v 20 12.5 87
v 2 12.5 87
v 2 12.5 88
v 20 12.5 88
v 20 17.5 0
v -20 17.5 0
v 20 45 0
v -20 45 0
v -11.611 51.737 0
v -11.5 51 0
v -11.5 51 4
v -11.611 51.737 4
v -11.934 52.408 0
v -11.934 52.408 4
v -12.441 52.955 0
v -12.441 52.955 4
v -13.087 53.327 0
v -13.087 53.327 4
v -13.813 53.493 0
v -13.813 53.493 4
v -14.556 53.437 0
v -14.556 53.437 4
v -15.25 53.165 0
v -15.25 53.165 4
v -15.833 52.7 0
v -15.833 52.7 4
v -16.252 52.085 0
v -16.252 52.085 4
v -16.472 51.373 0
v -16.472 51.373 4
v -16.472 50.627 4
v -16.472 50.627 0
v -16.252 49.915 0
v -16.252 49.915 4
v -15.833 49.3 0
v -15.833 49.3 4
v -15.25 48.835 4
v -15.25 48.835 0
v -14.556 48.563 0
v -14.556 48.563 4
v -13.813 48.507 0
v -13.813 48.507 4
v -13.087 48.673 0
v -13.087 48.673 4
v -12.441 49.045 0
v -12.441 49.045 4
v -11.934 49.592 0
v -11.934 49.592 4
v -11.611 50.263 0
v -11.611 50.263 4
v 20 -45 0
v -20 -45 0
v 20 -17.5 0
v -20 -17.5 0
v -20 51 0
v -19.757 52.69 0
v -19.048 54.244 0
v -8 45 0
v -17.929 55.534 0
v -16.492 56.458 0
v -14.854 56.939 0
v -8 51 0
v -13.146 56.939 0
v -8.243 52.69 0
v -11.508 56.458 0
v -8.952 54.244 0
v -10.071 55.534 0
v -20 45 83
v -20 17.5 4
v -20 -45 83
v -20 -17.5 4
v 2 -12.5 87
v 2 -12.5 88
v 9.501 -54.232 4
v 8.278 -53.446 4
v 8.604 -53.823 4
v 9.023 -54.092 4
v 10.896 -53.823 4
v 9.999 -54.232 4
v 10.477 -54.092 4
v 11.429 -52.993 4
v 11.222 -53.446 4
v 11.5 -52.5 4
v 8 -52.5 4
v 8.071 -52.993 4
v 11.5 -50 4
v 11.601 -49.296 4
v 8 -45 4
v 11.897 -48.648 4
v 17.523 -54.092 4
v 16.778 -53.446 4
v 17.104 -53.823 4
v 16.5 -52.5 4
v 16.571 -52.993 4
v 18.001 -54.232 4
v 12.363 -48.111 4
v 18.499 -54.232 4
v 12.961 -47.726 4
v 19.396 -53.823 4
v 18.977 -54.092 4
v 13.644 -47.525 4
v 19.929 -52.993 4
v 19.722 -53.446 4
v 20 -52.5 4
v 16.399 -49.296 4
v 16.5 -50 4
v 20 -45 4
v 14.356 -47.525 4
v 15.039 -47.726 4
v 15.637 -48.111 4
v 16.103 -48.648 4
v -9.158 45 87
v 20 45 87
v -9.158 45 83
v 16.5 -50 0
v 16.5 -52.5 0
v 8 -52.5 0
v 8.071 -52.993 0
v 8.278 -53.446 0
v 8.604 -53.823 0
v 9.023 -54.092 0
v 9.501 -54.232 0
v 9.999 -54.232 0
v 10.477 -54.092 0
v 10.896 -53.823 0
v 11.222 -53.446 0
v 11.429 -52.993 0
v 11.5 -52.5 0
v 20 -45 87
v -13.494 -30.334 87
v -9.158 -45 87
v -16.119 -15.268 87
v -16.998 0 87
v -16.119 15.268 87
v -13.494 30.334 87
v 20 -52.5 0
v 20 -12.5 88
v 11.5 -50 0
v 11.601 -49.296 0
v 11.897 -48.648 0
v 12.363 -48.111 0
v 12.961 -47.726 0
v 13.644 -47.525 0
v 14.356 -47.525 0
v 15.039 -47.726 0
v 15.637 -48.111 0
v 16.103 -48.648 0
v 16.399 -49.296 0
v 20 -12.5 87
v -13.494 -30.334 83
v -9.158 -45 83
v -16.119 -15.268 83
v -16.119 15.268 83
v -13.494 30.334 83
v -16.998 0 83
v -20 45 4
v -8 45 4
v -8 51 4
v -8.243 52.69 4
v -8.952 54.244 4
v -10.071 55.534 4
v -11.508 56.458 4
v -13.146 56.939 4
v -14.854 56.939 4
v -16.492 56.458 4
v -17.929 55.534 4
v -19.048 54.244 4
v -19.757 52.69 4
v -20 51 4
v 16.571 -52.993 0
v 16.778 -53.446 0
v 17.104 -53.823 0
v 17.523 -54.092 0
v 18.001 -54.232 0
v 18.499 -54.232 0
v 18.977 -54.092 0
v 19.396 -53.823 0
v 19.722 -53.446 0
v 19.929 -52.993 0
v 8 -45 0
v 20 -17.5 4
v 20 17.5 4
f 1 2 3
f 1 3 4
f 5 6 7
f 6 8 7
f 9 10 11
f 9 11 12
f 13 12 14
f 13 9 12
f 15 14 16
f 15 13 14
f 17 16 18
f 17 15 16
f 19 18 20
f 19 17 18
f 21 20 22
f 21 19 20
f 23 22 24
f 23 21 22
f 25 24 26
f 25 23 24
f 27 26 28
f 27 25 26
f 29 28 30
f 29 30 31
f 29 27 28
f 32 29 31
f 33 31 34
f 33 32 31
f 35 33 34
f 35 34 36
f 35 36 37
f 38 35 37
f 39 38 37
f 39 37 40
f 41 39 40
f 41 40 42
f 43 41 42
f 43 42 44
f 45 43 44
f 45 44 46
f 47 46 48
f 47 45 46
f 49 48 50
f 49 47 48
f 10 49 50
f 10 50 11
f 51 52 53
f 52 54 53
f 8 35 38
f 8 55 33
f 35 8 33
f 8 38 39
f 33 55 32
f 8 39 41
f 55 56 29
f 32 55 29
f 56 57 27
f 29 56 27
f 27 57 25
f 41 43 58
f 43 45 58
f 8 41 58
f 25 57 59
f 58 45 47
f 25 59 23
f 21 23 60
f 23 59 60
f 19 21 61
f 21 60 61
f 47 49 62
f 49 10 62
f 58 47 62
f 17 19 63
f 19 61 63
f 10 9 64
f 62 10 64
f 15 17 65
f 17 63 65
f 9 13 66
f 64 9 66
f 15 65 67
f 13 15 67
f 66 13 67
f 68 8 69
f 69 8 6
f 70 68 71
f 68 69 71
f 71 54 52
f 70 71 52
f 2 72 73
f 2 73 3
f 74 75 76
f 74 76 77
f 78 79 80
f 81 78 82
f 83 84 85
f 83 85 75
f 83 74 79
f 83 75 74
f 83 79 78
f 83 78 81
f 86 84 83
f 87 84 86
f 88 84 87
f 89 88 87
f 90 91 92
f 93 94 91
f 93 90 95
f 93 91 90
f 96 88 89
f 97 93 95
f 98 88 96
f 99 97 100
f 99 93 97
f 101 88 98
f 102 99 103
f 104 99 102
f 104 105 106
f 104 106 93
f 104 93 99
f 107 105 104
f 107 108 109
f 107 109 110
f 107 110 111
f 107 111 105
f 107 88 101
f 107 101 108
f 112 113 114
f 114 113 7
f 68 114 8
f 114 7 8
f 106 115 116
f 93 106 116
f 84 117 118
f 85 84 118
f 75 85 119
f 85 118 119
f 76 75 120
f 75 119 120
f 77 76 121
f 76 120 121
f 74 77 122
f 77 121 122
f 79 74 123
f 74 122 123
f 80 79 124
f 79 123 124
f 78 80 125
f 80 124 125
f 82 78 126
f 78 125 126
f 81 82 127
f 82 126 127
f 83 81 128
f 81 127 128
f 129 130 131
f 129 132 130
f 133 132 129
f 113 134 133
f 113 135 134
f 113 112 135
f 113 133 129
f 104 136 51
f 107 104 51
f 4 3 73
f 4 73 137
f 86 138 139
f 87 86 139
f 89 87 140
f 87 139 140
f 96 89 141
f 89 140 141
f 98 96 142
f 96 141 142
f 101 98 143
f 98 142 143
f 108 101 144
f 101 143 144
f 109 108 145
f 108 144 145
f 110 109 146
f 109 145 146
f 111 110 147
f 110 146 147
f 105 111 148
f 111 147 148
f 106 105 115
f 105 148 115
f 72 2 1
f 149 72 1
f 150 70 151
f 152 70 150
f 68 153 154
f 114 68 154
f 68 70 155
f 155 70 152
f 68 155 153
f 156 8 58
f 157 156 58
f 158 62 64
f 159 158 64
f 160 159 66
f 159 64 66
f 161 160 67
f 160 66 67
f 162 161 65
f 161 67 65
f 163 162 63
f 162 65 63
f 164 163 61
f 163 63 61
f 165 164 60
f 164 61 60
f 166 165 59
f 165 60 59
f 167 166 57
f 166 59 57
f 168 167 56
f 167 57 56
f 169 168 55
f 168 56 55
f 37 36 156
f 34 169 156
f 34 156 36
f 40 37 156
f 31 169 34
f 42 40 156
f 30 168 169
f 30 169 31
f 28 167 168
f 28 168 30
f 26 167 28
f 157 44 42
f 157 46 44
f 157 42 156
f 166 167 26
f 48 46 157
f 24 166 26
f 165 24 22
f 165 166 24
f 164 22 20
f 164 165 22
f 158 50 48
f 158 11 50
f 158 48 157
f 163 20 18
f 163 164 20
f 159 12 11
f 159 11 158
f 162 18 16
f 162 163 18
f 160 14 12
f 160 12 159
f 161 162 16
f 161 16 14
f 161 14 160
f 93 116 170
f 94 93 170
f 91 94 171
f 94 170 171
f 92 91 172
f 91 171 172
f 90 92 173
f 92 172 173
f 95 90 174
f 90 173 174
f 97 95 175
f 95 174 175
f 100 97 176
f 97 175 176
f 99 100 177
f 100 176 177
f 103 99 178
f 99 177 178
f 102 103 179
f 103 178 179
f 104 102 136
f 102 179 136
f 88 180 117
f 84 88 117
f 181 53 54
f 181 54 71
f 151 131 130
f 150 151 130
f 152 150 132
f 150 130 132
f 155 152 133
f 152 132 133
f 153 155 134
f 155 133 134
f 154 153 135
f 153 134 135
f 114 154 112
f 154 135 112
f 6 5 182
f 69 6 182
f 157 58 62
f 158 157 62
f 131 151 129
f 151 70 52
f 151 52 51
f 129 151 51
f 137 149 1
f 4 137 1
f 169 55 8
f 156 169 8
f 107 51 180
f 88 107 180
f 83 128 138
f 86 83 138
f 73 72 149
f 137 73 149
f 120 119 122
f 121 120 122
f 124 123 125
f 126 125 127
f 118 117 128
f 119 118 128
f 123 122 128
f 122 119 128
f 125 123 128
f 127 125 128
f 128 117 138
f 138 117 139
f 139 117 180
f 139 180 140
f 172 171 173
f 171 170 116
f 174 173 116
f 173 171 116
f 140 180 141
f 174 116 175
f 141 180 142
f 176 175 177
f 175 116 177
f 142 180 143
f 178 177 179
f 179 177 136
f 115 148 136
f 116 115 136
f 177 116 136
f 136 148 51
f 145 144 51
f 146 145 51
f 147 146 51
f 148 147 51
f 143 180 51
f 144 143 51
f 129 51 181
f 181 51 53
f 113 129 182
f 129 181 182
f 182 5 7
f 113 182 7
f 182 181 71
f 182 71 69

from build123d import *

# Parameters (mm, degrees)
F1_DEPTH = 87
F0_R     = 2.5
F2_DEPTH = 4
F4_DEPTH = 4
F5_W     = 18
F5_H     = 25
F6_DEPTH = 1
F7_W     = 35
F7_H     = 4
F8_DEPTH = 40.001


with BuildPart() as f1:
    # F0 (on Top) → F1 (new body)
    with BuildSketch(Plane.XY):
        Polygon((20, -45), (20, 45), (-8, 45), (-20, 45), (-20, -45), (8, -45), align=None)
    extrude(amount=F1_DEPTH)

    # F3 (on face) → F4 (cut)
    with BuildSketch(Plane.XY.offset(87)):
        Polygon((-20, 45), (-9.158122, 45), (-9.158122, 62.903538), (-46.149671, 62.903538), (-46.149671, -56.387458), (-9.158122, -56.387458), (-9.158122, -45), (-20, -45), align=None)
        with BuildLine():
            ThreePointArc((-9.158122, -45), (-16.998211, 0), (-9.158122, 45))
            Line((-9.158122, 45), (-20, 45))
            Line((-20, 45), (-20, -45))
            Line((-20, -45), (-9.158122, -45))
        make_face()
    extrude(amount=-F4_DEPTH, mode=Mode.SUBTRACT)

    # F7 (on face) → F8 (cut, through all)
    with BuildSketch(Plane.YZ.offset(20)):
        with Locations((0, 2)):
            Rectangle(F7_W, F7_H)
    extrude(amount=-F8_DEPTH, mode=Mode.SUBTRACT)


with BuildPart() as f2:
    # F0 (on Top) → F2 (new body)
    with BuildSketch(Plane.XY):
        with BuildLine():
            Line((-20, 45), (-8, 45))
            Line((-8, 45), (-8, 51))
            ThreePointArc((-8, 51), (-14, 57), (-20, 51))
            Line((-20, 51), (-20, 45))
        make_face()
        with Locations((-14, 51)):
            Circle(F0_R, mode=Mode.SUBTRACT)
        with BuildLine():
            Line((20, -52.5), (20, -45))
            Line((20, -45), (8, -45))
            Line((8, -45), (8, -52.5))
            ThreePointArc((8, -52.5), (9.75, -54.25), (11.5, -52.5))
            Line((11.5, -52.5), (11.5, -50))
            ThreePointArc((11.5, -50), (14, -47.5), (16.5, -50))
            Line((16.5, -50), (16.5, -52.5))
            ThreePointArc((16.5, -52.5), (18.25, -54.25), (20, -52.5))
        make_face()
    extrude(amount=F2_DEPTH)


with BuildPart() as f6:
    # F5 (on face) → F6 (new body)
    with BuildSketch(Plane.XY.offset(87)):
        with Locations((11, 0)):
            Rectangle(F5_W, F5_H)
    extrude(amount=F6_DEPTH)


solid = Compound([f1.part, f2.part, f6.part])
